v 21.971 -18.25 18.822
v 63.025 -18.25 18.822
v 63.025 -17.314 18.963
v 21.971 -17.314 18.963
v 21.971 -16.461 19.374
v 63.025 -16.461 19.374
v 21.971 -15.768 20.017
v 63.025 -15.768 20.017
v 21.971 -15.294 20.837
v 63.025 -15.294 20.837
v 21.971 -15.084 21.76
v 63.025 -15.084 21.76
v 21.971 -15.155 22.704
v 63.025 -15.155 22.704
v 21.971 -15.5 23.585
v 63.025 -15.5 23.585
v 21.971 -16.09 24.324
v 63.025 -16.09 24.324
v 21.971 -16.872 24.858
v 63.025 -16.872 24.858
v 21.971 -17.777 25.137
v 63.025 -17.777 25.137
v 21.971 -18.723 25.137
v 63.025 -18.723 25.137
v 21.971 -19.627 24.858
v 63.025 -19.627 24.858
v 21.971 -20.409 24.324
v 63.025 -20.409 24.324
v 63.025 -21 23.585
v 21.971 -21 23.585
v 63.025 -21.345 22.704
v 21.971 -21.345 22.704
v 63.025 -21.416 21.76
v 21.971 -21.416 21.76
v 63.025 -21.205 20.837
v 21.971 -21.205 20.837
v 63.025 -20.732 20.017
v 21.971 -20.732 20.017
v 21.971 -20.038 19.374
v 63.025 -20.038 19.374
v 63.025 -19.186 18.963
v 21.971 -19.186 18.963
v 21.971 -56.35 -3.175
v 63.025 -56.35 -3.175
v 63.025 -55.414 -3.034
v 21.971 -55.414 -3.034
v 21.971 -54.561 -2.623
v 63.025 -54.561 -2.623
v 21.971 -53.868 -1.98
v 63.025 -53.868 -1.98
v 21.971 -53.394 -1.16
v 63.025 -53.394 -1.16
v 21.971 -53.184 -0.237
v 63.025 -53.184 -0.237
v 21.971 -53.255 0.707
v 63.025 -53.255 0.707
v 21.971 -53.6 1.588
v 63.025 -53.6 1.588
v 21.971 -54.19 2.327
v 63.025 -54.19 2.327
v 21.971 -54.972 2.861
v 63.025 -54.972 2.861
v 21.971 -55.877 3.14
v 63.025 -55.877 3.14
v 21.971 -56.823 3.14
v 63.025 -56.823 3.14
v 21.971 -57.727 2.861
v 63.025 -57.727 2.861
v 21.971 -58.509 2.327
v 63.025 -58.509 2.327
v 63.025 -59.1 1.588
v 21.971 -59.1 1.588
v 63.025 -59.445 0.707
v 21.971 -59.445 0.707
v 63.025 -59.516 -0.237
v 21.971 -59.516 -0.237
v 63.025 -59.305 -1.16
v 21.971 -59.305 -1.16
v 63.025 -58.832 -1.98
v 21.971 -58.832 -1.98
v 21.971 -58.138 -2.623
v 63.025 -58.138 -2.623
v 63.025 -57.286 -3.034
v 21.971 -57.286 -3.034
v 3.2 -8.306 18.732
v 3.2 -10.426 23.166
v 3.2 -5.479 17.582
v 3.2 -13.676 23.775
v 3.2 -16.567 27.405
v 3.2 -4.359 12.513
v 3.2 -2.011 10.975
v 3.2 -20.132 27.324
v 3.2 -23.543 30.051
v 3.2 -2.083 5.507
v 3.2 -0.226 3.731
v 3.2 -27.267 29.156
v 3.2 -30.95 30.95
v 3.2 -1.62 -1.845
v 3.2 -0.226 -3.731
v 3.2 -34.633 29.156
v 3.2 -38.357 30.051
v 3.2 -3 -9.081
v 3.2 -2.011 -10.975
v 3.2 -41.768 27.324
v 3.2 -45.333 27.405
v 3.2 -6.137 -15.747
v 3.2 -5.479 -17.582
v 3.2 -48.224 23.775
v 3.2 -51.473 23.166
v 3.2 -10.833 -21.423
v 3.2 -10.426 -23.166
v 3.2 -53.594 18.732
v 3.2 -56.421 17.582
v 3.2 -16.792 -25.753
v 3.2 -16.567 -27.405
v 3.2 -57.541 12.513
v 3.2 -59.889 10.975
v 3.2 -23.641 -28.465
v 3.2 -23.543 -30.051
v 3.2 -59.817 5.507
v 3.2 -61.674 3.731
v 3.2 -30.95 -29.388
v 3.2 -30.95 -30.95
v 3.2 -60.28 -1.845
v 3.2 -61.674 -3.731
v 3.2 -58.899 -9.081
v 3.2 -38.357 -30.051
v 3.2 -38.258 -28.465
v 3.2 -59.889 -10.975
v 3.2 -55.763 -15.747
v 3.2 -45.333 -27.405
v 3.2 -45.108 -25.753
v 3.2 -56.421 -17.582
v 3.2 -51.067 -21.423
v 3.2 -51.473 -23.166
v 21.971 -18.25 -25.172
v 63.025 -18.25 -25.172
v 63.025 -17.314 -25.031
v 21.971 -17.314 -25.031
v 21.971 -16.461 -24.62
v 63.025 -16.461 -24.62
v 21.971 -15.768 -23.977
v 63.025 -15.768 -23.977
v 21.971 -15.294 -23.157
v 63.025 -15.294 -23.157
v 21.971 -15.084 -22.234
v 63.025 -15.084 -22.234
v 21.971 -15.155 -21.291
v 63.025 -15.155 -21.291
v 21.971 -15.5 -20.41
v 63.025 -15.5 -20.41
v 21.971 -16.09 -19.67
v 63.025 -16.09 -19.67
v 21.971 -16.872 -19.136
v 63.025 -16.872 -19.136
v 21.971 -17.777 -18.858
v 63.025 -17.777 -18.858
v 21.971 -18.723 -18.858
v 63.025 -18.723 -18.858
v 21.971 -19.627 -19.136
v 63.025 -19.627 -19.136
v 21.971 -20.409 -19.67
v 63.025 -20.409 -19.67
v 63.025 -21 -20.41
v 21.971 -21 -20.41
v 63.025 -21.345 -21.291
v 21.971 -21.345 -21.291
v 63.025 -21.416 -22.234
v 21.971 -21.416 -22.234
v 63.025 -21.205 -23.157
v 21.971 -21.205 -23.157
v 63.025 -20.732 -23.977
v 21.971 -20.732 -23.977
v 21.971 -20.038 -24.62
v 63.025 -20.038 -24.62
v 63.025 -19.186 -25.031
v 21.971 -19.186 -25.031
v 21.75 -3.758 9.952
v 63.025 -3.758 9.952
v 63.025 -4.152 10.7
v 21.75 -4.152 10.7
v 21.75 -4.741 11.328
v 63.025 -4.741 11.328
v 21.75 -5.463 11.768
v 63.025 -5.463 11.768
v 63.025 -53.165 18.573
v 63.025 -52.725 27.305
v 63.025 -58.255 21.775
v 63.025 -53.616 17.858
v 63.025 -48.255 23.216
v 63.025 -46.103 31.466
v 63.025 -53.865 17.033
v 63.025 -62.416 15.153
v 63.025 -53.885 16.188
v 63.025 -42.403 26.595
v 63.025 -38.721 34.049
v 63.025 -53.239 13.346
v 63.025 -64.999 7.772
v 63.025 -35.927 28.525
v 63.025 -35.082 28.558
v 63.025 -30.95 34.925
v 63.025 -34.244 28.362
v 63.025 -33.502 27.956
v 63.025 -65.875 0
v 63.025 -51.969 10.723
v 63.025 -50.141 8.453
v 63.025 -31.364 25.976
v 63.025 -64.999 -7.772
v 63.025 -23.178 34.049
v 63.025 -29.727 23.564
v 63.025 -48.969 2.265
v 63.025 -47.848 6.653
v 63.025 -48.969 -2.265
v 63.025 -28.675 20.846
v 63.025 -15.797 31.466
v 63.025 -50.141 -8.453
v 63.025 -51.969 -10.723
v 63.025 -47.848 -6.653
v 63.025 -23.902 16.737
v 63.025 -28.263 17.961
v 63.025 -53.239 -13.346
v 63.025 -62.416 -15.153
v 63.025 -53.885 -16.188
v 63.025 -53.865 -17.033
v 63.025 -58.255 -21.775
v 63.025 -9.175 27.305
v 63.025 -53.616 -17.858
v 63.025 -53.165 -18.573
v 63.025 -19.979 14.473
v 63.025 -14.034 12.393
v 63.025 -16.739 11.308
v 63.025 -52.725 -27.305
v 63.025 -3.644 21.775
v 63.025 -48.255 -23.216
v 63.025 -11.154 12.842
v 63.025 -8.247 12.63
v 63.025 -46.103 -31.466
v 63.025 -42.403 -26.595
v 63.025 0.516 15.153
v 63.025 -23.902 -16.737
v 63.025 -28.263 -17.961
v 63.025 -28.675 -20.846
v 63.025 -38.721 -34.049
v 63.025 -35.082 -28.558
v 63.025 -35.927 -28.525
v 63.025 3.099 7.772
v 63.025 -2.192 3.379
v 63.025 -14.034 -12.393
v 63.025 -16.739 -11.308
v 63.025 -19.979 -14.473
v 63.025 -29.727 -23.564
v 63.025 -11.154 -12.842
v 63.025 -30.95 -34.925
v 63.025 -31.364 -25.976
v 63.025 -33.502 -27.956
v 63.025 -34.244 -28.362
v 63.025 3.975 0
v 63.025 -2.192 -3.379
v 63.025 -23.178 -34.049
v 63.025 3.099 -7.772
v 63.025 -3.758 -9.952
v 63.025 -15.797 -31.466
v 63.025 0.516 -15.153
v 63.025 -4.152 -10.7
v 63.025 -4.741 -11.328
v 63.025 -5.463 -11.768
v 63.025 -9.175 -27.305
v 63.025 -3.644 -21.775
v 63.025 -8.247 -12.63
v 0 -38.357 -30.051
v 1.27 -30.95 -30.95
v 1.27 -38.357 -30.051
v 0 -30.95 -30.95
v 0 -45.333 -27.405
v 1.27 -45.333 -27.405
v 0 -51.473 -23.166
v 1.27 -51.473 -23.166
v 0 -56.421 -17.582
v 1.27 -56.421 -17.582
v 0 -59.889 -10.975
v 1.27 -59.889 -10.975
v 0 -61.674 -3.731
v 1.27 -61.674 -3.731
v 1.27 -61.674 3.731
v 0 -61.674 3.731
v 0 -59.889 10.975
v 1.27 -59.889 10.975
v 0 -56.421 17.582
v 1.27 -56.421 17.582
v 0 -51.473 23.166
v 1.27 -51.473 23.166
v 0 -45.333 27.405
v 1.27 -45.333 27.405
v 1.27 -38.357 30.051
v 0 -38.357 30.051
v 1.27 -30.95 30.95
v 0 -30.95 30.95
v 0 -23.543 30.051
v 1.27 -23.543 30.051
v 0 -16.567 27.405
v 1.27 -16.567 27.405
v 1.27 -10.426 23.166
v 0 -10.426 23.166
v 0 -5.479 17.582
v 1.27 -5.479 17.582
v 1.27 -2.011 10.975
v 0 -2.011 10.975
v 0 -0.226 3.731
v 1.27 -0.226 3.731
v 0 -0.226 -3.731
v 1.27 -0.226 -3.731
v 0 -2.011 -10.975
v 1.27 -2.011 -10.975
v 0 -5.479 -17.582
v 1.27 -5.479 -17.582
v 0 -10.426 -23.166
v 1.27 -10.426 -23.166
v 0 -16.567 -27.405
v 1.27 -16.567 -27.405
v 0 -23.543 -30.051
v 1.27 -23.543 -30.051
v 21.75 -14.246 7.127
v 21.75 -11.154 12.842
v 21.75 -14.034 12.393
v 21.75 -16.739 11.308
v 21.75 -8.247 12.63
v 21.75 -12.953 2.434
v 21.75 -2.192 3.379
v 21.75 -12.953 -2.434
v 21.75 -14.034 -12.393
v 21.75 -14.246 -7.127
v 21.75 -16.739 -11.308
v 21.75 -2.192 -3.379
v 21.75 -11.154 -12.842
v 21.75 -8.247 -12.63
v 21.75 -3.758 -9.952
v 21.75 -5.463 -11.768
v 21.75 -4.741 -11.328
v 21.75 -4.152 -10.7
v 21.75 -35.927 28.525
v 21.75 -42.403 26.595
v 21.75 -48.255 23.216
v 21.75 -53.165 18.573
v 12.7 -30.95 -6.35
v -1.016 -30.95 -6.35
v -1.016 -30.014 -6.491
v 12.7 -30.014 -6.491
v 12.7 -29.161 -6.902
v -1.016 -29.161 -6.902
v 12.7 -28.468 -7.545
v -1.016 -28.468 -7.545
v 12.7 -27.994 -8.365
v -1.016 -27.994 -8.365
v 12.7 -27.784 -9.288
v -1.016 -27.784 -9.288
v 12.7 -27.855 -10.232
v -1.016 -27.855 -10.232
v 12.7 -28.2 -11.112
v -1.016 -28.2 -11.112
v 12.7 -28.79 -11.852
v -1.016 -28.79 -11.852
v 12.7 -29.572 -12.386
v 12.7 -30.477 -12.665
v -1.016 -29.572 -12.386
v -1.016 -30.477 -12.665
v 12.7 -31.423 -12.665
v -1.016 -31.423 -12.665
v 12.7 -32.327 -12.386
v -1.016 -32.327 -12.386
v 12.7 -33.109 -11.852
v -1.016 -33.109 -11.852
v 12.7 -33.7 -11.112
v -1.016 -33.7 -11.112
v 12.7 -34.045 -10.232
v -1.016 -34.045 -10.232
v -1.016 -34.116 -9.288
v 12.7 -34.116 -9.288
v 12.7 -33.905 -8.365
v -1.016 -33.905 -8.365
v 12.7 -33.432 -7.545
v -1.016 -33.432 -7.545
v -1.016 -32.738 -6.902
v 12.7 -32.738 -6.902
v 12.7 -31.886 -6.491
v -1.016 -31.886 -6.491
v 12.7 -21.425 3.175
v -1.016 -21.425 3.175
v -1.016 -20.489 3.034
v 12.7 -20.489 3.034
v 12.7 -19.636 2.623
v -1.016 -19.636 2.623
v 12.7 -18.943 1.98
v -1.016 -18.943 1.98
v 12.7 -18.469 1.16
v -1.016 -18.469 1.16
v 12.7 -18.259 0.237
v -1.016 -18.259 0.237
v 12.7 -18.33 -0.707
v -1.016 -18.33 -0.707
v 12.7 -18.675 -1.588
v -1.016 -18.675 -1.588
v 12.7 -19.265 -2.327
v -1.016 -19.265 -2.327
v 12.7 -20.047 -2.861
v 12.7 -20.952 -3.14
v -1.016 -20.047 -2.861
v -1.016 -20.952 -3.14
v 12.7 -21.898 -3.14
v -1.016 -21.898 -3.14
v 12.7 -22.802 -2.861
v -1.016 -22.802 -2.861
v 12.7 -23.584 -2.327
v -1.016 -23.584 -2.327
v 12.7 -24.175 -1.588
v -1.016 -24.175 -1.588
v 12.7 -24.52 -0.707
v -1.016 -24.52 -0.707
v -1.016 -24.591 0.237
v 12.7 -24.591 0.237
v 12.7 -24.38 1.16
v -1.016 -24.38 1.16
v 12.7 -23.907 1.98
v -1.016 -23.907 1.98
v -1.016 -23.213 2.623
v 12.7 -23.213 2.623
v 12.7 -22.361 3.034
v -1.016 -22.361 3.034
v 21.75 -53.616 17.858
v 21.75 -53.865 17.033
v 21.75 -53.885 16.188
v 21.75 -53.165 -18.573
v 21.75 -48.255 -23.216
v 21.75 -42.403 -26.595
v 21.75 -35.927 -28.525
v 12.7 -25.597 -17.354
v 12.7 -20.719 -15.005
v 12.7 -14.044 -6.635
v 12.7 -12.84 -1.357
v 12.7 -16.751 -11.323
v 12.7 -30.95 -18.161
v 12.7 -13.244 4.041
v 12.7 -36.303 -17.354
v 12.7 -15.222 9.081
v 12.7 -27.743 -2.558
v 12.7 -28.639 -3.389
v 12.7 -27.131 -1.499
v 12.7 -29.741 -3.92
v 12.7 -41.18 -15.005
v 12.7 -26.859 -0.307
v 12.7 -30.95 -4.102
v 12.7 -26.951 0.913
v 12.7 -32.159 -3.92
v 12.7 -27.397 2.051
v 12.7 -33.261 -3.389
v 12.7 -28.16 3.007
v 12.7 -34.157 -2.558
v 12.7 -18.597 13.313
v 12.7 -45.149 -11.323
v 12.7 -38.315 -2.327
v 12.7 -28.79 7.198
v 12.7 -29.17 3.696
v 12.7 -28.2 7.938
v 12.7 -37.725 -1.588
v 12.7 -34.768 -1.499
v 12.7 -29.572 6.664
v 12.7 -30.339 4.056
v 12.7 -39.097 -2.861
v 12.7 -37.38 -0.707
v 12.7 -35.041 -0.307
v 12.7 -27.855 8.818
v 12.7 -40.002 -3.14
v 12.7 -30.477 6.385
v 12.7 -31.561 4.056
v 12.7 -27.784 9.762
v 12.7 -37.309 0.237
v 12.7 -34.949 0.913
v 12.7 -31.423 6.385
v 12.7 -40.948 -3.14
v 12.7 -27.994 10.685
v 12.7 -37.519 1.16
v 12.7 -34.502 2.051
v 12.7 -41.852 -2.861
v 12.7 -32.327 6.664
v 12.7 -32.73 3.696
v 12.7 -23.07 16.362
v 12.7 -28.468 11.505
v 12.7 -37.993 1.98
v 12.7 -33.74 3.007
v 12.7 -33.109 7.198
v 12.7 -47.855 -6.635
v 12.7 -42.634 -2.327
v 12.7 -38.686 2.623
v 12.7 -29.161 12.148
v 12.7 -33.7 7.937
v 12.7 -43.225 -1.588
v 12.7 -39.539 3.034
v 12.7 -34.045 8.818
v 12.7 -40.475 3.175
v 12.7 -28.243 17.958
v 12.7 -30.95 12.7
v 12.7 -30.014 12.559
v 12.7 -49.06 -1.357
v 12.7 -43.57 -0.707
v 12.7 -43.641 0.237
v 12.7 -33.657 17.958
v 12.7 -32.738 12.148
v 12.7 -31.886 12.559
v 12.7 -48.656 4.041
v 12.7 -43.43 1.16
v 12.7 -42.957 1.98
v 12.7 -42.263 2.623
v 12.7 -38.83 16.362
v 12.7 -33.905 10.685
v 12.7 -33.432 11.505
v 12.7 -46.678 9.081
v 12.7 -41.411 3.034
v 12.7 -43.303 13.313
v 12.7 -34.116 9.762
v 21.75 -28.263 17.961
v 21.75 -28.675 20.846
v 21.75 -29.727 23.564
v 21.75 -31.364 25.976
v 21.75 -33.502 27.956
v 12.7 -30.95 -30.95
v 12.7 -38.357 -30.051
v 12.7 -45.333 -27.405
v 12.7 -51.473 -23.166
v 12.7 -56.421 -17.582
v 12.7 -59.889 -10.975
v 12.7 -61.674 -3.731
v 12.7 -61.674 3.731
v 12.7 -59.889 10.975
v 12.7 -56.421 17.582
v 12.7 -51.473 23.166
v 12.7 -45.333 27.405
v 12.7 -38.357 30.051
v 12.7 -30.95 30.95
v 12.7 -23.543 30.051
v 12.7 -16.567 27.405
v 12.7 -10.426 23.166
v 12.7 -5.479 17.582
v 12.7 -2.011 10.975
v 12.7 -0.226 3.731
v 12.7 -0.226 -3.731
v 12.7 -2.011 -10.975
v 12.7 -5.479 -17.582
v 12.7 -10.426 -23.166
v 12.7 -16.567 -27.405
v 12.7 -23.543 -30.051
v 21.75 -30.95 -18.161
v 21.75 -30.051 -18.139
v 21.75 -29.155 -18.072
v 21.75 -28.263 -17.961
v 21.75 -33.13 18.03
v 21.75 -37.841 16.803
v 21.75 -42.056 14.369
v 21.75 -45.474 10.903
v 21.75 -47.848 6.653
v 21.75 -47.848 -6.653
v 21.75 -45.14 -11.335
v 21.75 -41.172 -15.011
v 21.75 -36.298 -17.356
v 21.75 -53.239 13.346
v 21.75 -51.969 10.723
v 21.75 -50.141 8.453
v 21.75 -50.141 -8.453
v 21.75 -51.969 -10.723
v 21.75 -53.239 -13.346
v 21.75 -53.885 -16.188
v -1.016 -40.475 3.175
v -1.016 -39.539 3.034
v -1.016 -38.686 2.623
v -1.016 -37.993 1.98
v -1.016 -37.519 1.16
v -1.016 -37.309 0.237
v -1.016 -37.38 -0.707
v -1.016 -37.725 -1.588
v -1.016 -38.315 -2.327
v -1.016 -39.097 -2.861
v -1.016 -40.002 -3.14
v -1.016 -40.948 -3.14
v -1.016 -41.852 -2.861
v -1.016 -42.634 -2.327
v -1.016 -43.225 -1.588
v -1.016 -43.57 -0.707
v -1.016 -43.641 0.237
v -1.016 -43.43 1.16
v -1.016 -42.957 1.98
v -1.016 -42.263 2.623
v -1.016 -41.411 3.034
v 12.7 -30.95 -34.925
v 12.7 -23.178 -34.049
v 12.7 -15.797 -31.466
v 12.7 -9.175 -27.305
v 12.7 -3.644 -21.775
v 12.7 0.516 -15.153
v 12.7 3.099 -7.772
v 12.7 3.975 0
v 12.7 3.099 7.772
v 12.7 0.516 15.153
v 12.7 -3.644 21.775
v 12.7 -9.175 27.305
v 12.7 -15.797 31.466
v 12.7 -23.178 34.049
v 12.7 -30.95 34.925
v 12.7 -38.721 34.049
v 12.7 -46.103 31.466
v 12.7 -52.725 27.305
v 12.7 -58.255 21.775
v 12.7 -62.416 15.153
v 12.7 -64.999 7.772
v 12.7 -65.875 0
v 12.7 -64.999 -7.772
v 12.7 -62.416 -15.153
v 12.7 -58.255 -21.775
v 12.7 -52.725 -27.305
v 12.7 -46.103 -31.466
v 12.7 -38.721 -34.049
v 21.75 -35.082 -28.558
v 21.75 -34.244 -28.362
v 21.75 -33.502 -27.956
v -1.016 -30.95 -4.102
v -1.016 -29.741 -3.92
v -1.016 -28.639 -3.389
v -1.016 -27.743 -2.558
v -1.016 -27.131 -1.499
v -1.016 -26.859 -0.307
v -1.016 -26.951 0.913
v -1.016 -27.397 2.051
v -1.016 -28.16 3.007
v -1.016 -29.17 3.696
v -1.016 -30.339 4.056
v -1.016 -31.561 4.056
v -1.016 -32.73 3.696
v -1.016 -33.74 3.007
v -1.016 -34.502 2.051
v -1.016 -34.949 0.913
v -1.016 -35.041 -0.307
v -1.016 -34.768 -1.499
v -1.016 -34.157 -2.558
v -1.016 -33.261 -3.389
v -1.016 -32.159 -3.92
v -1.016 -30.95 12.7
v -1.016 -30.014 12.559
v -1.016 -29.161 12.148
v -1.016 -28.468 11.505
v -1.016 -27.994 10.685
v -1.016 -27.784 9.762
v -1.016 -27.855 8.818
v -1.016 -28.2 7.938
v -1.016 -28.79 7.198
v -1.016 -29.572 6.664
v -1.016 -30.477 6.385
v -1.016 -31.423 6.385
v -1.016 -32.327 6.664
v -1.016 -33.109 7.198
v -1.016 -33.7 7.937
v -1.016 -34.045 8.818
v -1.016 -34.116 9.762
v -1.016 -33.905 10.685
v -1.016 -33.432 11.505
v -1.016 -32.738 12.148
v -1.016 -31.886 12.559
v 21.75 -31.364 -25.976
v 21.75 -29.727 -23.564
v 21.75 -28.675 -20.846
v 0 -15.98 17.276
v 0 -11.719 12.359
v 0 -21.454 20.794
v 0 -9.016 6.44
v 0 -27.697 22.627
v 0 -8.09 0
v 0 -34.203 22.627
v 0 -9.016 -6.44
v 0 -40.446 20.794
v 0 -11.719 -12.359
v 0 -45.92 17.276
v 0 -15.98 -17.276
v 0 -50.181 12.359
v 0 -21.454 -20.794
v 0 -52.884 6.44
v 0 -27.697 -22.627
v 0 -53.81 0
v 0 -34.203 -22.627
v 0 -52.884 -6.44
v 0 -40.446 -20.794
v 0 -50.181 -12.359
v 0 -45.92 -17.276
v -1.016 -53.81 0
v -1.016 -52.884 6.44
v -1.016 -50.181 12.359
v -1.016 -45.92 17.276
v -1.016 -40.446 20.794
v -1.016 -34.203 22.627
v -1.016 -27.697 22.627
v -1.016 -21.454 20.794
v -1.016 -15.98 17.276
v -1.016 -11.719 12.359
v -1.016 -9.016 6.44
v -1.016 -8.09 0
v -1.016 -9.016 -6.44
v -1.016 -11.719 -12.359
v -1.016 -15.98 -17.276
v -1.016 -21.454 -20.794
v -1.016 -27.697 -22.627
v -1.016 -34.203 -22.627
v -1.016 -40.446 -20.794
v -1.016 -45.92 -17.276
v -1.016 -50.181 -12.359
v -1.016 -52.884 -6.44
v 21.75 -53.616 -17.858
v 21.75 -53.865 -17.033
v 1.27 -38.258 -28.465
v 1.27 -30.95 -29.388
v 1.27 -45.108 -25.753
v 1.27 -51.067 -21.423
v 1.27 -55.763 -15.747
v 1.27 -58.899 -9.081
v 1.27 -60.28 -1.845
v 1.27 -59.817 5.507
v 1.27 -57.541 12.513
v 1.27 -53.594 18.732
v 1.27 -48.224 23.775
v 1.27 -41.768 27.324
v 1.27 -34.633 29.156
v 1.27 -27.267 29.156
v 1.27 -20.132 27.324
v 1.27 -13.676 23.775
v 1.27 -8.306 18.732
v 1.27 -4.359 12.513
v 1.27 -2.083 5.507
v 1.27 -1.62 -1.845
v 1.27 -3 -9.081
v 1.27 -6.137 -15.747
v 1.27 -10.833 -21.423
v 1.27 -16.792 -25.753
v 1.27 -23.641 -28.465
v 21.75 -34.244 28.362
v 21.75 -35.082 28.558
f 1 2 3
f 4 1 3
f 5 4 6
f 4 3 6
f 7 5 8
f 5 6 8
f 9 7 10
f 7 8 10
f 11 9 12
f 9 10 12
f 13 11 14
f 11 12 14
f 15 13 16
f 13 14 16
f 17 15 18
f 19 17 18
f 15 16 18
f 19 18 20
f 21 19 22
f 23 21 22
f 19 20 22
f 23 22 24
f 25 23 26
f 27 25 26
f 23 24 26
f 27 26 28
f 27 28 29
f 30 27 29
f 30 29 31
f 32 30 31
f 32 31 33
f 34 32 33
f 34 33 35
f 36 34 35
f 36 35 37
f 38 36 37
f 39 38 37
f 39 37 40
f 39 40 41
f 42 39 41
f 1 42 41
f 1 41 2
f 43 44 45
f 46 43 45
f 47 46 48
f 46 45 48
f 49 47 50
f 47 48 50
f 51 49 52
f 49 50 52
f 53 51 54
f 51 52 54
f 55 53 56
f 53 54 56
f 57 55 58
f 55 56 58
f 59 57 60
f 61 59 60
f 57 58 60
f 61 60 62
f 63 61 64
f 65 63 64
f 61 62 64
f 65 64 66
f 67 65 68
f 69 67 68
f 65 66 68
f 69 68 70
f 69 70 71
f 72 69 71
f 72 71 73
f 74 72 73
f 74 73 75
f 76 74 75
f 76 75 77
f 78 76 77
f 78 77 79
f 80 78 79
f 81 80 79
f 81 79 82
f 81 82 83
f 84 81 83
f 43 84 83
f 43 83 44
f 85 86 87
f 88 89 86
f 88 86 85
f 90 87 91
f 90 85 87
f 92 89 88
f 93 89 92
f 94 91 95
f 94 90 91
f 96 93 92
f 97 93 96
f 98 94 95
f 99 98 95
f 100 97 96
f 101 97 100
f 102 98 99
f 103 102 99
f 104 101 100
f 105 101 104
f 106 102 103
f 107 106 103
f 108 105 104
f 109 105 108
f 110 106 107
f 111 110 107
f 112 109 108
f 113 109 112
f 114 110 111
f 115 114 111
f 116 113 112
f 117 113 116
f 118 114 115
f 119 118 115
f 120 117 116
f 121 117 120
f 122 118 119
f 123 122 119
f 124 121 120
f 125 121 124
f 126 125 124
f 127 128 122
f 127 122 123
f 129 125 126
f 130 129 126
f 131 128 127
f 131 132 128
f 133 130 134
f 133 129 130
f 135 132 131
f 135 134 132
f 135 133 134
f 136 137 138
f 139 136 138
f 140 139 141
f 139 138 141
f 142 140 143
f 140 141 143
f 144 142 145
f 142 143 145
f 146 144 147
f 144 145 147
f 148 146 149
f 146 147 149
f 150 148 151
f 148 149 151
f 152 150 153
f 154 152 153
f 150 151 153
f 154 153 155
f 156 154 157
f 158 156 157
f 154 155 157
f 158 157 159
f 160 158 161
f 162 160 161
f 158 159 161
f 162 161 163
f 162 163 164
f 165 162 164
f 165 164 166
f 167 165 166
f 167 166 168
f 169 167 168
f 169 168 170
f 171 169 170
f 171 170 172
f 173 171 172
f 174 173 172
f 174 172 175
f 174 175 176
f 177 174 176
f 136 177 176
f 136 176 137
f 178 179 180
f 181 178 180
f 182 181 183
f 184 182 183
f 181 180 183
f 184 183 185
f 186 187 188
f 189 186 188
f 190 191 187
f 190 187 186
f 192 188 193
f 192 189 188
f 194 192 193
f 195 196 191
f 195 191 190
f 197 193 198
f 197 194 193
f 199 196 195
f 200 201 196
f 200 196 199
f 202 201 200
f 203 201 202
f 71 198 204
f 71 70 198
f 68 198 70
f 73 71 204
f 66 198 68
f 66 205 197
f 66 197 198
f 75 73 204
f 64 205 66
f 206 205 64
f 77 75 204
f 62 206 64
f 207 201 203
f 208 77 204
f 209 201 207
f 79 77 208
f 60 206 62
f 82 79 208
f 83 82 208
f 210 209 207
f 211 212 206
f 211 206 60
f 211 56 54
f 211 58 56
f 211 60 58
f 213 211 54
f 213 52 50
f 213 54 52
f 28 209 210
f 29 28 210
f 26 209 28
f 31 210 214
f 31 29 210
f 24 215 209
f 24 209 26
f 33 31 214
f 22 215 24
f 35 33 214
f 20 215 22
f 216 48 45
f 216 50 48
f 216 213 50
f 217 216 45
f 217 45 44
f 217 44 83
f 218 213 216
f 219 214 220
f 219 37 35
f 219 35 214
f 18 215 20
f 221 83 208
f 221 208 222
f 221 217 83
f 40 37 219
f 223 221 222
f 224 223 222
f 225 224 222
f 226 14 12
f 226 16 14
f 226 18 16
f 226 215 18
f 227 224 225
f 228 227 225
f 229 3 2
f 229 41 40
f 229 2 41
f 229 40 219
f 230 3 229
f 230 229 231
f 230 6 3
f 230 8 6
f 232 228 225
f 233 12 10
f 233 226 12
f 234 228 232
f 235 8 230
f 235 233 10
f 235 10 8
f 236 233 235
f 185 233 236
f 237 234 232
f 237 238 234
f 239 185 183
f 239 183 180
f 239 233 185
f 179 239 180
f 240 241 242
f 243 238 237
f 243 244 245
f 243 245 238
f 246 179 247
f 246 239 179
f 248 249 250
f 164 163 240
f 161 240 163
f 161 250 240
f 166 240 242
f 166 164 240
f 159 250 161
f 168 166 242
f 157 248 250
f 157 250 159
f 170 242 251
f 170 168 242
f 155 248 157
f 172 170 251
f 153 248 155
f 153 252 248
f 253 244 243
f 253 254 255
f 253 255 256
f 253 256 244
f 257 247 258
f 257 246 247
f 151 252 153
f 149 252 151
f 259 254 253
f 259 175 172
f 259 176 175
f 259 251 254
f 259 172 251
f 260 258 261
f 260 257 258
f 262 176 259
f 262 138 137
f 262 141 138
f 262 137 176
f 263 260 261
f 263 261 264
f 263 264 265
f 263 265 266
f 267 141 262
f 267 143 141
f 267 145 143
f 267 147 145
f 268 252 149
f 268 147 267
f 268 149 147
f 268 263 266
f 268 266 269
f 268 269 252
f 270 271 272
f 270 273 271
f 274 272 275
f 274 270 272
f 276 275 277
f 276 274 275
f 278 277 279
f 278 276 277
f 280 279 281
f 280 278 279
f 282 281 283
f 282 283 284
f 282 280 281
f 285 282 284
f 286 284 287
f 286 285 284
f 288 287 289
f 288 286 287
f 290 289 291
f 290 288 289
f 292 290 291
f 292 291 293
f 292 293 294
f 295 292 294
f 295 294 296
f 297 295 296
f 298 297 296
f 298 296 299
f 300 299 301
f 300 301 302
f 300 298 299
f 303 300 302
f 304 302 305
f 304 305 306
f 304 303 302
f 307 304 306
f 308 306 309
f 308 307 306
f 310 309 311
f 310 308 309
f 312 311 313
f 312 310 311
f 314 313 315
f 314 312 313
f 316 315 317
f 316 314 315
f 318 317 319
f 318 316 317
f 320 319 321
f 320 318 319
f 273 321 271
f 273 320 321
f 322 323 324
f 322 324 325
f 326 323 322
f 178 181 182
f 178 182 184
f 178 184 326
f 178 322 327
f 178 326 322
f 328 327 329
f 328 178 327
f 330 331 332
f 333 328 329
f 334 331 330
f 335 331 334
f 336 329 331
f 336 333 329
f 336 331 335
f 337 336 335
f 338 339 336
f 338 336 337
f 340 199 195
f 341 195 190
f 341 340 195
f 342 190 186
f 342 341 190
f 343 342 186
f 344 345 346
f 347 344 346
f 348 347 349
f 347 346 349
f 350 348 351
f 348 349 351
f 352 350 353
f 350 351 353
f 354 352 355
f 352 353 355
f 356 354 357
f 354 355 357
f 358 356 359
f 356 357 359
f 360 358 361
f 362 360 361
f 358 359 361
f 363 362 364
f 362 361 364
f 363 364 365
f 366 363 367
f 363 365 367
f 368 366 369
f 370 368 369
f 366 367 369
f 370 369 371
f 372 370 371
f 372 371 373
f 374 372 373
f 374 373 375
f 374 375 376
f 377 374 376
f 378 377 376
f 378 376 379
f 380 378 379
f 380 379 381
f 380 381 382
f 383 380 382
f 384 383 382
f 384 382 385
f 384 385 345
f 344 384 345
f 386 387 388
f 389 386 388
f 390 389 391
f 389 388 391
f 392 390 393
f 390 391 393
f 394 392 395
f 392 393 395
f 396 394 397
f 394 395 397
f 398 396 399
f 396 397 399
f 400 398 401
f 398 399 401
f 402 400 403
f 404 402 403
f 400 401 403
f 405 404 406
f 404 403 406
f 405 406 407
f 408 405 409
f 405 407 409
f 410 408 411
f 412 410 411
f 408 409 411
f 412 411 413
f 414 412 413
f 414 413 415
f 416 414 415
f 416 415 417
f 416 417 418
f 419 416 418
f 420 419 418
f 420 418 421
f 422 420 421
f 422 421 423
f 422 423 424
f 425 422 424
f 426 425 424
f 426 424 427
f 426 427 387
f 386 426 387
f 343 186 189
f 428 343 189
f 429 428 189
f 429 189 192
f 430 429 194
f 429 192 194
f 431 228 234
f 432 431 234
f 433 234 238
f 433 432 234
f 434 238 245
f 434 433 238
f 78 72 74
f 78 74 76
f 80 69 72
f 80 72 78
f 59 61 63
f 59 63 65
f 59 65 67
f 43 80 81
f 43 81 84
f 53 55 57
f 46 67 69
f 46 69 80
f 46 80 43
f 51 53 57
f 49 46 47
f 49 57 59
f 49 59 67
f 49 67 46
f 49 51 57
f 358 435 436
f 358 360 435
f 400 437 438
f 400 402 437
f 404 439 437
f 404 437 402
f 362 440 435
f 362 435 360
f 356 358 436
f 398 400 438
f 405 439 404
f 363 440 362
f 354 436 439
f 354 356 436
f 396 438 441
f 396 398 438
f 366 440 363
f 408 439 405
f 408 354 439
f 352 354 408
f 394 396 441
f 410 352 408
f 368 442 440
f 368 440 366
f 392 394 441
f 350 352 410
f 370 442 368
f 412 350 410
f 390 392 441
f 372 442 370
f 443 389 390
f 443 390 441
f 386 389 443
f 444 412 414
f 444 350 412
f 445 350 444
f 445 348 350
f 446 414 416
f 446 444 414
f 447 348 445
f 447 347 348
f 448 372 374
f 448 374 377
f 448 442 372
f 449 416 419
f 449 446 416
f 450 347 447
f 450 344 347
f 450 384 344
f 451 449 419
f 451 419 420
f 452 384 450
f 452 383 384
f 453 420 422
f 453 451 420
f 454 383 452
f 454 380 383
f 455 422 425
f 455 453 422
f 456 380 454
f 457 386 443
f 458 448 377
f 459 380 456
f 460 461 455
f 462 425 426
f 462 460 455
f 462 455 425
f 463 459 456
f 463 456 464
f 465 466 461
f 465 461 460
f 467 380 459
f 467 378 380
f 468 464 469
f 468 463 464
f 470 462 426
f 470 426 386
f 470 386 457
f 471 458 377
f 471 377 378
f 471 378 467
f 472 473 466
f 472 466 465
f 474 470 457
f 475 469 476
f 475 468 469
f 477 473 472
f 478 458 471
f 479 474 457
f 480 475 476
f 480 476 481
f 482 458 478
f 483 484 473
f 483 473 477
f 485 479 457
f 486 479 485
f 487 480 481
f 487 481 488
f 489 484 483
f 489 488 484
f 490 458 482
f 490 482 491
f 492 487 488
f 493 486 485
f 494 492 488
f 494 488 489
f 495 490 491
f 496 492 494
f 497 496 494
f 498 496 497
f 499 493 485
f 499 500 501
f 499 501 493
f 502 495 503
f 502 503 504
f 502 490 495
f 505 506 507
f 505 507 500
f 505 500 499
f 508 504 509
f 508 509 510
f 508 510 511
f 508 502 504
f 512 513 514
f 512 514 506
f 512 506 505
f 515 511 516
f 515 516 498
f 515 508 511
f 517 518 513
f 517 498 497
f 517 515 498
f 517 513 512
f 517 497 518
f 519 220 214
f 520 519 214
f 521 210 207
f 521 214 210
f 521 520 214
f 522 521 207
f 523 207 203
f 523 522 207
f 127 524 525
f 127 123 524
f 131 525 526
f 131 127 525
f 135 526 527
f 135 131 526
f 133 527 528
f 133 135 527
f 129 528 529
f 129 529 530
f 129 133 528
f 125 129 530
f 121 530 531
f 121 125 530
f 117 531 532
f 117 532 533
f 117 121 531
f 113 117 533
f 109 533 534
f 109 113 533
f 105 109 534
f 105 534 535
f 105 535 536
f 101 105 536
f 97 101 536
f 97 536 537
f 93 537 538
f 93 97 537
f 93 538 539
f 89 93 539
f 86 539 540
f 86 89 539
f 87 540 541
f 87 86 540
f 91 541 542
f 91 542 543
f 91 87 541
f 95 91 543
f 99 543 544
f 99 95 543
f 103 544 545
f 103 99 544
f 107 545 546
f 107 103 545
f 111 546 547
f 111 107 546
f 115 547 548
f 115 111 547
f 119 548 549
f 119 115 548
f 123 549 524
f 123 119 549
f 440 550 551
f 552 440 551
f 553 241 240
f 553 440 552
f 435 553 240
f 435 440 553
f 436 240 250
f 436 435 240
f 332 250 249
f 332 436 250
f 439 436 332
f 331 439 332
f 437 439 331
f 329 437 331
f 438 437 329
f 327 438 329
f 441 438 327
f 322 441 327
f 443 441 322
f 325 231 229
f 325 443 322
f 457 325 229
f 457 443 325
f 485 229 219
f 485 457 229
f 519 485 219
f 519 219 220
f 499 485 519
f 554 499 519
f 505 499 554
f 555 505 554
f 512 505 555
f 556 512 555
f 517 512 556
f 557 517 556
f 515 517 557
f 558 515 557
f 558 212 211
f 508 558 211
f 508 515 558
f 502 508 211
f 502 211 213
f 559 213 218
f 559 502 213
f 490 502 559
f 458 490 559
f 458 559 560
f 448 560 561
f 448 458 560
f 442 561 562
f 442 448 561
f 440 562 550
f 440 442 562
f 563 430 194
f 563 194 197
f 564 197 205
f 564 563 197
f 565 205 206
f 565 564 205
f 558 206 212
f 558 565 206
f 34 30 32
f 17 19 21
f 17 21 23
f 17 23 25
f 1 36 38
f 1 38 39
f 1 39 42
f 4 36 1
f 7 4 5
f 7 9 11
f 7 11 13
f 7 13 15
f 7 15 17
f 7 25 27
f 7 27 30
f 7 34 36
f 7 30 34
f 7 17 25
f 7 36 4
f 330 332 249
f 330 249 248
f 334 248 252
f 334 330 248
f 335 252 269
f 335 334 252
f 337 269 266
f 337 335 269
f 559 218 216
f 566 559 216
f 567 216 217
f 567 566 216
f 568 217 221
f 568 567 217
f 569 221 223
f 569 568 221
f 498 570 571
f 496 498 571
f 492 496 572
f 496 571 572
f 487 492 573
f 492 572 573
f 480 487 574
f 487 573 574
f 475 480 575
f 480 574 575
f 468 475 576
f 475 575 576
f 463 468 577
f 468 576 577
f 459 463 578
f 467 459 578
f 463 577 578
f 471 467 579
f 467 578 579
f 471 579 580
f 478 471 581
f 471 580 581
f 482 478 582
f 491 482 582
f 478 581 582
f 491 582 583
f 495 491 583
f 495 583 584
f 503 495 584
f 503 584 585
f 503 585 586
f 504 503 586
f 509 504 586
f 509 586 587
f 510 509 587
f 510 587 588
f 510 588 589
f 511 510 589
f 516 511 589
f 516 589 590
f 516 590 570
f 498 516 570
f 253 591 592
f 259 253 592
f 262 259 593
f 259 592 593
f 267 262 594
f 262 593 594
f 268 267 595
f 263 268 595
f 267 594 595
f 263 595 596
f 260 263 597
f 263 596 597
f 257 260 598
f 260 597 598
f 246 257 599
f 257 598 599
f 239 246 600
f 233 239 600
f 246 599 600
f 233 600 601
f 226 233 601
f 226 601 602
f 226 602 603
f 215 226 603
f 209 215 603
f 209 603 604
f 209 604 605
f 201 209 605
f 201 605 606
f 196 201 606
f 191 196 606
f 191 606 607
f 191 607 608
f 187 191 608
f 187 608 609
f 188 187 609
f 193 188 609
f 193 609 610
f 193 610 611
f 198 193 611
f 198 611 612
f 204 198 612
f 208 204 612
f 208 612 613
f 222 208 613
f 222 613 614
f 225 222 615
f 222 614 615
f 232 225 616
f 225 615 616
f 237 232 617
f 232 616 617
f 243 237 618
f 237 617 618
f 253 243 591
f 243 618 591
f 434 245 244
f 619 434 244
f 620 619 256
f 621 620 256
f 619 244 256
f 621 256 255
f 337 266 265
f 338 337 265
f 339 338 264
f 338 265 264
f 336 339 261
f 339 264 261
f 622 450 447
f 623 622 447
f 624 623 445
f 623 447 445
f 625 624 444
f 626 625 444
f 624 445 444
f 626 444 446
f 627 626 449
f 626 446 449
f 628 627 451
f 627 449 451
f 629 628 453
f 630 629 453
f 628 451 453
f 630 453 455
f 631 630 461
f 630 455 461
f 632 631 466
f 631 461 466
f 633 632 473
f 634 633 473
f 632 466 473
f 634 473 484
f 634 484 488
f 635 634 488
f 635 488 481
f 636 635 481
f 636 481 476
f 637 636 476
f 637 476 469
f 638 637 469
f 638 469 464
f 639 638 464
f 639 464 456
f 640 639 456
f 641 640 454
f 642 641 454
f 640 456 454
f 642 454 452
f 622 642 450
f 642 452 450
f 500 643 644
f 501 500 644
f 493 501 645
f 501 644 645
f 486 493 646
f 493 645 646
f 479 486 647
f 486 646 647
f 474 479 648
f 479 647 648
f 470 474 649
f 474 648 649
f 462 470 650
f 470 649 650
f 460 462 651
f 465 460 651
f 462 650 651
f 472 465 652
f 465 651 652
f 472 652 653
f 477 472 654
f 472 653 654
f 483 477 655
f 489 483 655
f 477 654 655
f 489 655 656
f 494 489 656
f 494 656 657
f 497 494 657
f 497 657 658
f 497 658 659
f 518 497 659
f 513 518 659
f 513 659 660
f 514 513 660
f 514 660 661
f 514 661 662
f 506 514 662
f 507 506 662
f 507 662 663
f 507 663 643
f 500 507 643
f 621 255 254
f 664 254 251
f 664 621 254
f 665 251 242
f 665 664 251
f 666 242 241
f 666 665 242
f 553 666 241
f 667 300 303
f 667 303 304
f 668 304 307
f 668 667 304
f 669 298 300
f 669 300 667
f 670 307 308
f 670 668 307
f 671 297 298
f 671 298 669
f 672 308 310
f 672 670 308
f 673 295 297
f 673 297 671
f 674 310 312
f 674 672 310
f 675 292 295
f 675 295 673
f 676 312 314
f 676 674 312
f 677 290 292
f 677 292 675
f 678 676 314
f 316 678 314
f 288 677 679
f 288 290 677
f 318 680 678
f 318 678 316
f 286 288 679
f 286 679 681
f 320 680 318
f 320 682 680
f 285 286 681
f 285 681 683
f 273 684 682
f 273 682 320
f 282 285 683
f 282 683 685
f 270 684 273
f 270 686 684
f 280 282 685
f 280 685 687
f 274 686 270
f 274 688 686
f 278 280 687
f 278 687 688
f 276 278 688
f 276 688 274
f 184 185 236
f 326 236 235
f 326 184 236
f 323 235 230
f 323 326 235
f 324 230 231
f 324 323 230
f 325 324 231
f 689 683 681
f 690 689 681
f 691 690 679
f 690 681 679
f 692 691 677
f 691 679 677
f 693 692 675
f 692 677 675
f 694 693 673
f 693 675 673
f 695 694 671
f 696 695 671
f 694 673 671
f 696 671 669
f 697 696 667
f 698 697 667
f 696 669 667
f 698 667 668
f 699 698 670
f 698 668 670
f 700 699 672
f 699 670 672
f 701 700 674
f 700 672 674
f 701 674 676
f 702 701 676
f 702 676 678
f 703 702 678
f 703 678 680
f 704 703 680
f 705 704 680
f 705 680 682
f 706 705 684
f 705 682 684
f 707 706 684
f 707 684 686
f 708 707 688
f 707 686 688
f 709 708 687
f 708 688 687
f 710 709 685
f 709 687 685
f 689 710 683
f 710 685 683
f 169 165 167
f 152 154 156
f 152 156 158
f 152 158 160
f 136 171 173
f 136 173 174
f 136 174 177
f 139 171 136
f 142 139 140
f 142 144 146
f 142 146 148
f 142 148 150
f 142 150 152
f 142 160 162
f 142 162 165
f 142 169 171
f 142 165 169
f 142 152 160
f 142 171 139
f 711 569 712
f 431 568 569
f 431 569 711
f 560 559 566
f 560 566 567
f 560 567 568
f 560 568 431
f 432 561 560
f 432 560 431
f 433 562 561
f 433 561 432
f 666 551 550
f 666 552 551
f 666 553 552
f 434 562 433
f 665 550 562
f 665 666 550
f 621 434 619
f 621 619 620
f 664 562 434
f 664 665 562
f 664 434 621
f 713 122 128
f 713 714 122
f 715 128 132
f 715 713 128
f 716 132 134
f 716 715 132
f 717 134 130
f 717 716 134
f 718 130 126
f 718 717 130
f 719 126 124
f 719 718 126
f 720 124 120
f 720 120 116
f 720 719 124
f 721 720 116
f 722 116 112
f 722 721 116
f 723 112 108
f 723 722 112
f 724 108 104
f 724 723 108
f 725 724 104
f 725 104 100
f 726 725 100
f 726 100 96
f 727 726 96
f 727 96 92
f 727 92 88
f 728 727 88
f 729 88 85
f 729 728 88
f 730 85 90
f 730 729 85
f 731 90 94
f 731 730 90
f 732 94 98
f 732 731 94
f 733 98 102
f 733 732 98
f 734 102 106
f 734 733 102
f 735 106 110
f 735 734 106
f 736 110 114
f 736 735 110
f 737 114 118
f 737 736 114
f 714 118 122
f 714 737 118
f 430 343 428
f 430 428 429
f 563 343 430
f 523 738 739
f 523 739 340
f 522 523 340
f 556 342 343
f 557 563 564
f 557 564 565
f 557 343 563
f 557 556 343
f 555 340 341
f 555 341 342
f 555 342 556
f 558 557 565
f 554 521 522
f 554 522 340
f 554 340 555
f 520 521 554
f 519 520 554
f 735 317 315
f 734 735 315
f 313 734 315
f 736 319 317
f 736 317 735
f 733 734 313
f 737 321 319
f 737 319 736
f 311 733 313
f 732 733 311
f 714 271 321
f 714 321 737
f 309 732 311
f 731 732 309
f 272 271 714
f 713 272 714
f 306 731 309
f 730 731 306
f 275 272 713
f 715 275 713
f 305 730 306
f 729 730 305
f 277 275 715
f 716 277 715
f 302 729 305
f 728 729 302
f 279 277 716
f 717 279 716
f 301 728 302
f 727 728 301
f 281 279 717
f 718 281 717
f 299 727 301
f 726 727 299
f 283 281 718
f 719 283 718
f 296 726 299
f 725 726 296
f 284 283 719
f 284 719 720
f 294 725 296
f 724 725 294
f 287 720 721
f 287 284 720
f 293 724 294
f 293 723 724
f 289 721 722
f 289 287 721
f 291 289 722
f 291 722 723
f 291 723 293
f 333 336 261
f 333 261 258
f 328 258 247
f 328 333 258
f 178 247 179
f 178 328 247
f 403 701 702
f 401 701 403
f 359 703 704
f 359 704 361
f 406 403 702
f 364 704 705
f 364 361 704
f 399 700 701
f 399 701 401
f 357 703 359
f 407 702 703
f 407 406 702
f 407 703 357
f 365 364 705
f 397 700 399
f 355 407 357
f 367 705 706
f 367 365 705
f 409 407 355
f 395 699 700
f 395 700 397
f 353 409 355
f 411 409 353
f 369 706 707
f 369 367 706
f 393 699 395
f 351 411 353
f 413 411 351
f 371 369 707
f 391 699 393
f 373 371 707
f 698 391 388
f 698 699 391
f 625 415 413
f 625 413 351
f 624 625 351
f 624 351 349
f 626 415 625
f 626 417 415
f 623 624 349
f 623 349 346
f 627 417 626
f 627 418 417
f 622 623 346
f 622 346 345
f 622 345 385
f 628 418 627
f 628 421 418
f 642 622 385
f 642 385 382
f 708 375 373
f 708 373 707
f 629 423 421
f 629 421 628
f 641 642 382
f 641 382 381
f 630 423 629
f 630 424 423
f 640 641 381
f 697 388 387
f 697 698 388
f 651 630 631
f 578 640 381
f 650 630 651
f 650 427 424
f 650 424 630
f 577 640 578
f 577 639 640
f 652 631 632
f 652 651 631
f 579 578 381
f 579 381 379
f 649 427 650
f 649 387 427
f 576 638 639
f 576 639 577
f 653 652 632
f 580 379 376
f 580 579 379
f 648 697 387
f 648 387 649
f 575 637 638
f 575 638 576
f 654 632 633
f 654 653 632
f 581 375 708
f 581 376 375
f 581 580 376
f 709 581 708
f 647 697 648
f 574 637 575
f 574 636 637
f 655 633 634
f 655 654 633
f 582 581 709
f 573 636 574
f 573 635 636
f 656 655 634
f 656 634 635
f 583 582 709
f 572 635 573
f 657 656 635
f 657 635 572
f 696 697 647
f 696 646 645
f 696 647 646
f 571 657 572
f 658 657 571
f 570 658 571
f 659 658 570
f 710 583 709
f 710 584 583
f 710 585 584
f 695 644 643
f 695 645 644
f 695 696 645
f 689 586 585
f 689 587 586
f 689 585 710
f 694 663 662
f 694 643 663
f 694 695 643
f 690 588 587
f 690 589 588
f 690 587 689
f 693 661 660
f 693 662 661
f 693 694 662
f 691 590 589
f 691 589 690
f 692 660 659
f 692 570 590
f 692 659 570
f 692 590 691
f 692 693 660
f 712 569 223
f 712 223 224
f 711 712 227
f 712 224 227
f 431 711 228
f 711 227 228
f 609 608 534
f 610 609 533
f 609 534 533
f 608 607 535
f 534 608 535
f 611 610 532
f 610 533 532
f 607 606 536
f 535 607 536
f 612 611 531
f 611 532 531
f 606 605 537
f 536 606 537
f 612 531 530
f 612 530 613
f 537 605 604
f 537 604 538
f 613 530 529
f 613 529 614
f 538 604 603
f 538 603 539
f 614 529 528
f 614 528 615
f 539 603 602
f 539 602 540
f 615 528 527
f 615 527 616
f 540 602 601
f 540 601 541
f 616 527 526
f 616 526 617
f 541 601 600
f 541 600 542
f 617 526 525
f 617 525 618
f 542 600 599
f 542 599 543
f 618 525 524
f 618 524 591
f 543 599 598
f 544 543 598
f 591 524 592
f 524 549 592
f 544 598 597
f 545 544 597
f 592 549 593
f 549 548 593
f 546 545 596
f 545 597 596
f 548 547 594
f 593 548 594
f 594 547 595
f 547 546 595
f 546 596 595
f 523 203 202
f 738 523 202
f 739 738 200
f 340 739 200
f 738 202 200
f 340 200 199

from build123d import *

# Parameters (mm, degrees)
SKETCH4_R                  = 34.925
SKETCH4_R_2                = 18.161
BOSS_EXTRUDE1_DEPTH        = 72.771
CUT_EXTRUDE2_REACH         = 137.172
CUT_EXTRUDE2_START         = 21.75002
TRIPOD_WALLS_R             = 3.175
SKETCH12_R                 = 3.175
CUT_EXTRUDE3_DEPTH         = 63.5
CUT_EXTRUDE4_START         = -22.44598
SKETCH13_R                 = 34.925
CUT_EXTRUDE4_DEPTH         = 22.44598
SKETCH16_R                 = 22.86
COMPENSATING_SPACING_DEPTH = 1.016
F_1_4_0_2500_DOWEL_HOLE1_D = 6.35
BOLT_CIRCLE_PATTERN_2_R    = 4.1021
F_5_16_CLEARNCE_DEPTH      = 13.716


with BuildPart() as part:
    # Sketch2 → Revolve1 (revolve)
    with BuildSketch(Plane.XY, mode=Mode.PRIVATE) as revolve1_sk:
        Polygon((0, 0), (0, -30.9499), (12.7, -30.9499), (12.7, 0), (3.2004, 0), (3.2004, -1.5621), (1.27, -1.5621), (1.27, 0), align=None)
    revolve(revolve1_sk.sketch.rotate(Axis((11.964521893, -30.9499, 0), (-1, 0, 0)), 90), axis=Axis((11.964521893, -30.9499, 0), (-1, 0, 0)))

    # Sketch4 → Boss-Extrude1 (add)
    with BuildSketch(Plane(origin=(12.7, 0, 0), x_dir=(0, 0, -1), z_dir=(1, 0, 0))):
        with Locations((0, -30.9499)):
            Circle(SKETCH4_R)
        with Locations((0, -30.9499)):
            Circle(SKETCH4_R_2, mode=Mode.SUBTRACT)
    extrude(amount=BOSS_EXTRUDE1_DEPTH)

    # Sketch5 → Cut-Extrude2 (cut, up to next)
    with BuildSketch(Plane(origin=(0, 0, 0), x_dir=(0, 0, -1), z_dir=(1, 0, 0)).offset(CUT_EXTRUDE2_START), mode=Mode.PRIVATE) as cut_extrude2_sk1:
        with BuildLine():
            ThreePointArc((-11.141810341, -4.2233215), (0, -23.4823), (11.141810341, -4.2233215))
            ThreePointArc((11.141810341, -4.2233215), (0, -1.9939), (-11.141810341, -4.2233215))
        make_face()
    cut_extrude2_tool1 = extrude(cut_extrude2_sk1.sketch, amount=CUT_EXTRUDE2_REACH, mode=Mode.PRIVATE) & part.part
    # Sketch5 → Cut-Extrude2 (cut, up to next)
    with BuildSketch(Plane(origin=(0, 0, 0), x_dir=(0, 0, -1), z_dir=(1, 0, 0)).offset(CUT_EXTRUDE2_START), mode=Mode.PRIVATE) as cut_extrude2_sk2:
        with BuildLine():
            ThreePointArc((-28.716801071, -34.664098733), (-25.076631449, -45.427900247), (-17.57499054, -53.962280223))
            ThreePointArc((-17.57499054, -53.962280223), (-6.467131268, -34.683700064), (-28.716801071, -34.664098733))
        make_face()
    cut_extrude2_tool2 = extrude(cut_extrude2_sk2.sketch, amount=CUT_EXTRUDE2_REACH, mode=Mode.PRIVATE) & part.part
    # Sketch5 → Cut-Extrude2 (cut, up to next)
    with BuildSketch(Plane(origin=(0, 0, 0), x_dir=(0, 0, -1), z_dir=(1, 0, 0)).offset(CUT_EXTRUDE2_START), mode=Mode.PRIVATE) as cut_extrude2_sk3:
        with BuildLine():
            ThreePointArc((28.716801071, -34.664098733), (6.467131268, -34.683700064), (17.57499054, -53.962280223))
            ThreePointArc((17.57499054, -53.962280223), (25.076631449, -45.427900247), (28.716801071, -34.664098733))
        make_face()
    cut_extrude2_tool3 = extrude(cut_extrude2_sk3.sketch, amount=CUT_EXTRUDE2_REACH, mode=Mode.PRIVATE) & part.part
    add(cut_extrude2_tool1.solids().sort_by_distance((21.75002, -12.135894, 0))[0], mode=Mode.SUBTRACT)
    add(cut_extrude2_tool2.solids().sort_by_distance((21.75002, -40.356903, 16.293407))[0], mode=Mode.SUBTRACT)
    add(cut_extrude2_tool3.solids().sort_by_distance((21.75002, -40.356903, -16.293407))[0], mode=Mode.SUBTRACT)

    # Tripod walls
    tripod_walls_edges = [part.edges().sort_by_distance(p)[0] for p in [
        (53.61051, -4.2233215, 11.141810341),
        (53.61051, -4.2233215, -11.141810341),
        (53.61051, -53.962280223, 17.57499054),
        (53.61051, -34.664098733, 28.716801071),
        (53.61051, -34.664098733, -28.716801071),
        (53.61051, -53.962280223, -17.57499054),
    ]]
    fillet(tripod_walls_edges, radius=TRIPOD_WALLS_R)

    # Sketch12 → Cut-Extrude3 (cut)
    with BuildSketch(Plane(origin=(85.471, 0, 0), x_dir=(0, 0, -1), z_dir=(1, 0, 0))):
        with Locations((-21.997045256, -18.2499)):
            Circle(SKETCH12_R)
        with Locations((21.997045256, -18.2499)):
            Circle(SKETCH12_R)
        with Locations((0, -56.3499)):
            Circle(SKETCH12_R)
    extrude(amount=-CUT_EXTRUDE3_DEPTH, mode=Mode.SUBTRACT)

    # Sketch13 → Cut-Extrude4 (cut)
    with BuildSketch(Plane(origin=(85.471, 0, 0), x_dir=(0, 0, -1), z_dir=(1, 0, 0)).offset(CUT_EXTRUDE4_START)):
        with Locations((0, -30.9499)):
            Circle(SKETCH13_R)
    extrude(amount=CUT_EXTRUDE4_DEPTH, mode=Mode.SUBTRACT)

    # Sketch16 → Compensating Spacing (add)
    with BuildSketch(Plane.ZY):
        with Locations(Location((0, -30.9499, 0), (0, 0, 270))):
            Circle(SKETCH16_R)
    extrude(amount=COMPENSATING_SPACING_DEPTH)

    # 1/4 (0.2500) Dowel Hole1 (through all)
    with Locations(Plane(origin=(12.7, 0, 0), x_dir=(0, 0, -1), z_dir=(1, 0, 0))):
        with Locations((0, -21.4249), (9.525, -30.9499), (0, -40.4749), (-9.525, -30.9499)):
            Hole(F_1_4_0_2500_DOWEL_HOLE1_D / 2)

    # Bolt Circle Pattern<2> → 5/16 Clearnce (cut)
    with BuildSketch(Plane(origin=(12.7, 0, 0), x_dir=(0, 0, -1), z_dir=(1, 0, 0))):
        with Locations((0, -30.9499)):
            Circle(BOLT_CIRCLE_PATTERN_2_R)
    extrude(amount=-F_5_16_CLEARNCE_DEPTH, mode=Mode.SUBTRACT)


solid = part.part
